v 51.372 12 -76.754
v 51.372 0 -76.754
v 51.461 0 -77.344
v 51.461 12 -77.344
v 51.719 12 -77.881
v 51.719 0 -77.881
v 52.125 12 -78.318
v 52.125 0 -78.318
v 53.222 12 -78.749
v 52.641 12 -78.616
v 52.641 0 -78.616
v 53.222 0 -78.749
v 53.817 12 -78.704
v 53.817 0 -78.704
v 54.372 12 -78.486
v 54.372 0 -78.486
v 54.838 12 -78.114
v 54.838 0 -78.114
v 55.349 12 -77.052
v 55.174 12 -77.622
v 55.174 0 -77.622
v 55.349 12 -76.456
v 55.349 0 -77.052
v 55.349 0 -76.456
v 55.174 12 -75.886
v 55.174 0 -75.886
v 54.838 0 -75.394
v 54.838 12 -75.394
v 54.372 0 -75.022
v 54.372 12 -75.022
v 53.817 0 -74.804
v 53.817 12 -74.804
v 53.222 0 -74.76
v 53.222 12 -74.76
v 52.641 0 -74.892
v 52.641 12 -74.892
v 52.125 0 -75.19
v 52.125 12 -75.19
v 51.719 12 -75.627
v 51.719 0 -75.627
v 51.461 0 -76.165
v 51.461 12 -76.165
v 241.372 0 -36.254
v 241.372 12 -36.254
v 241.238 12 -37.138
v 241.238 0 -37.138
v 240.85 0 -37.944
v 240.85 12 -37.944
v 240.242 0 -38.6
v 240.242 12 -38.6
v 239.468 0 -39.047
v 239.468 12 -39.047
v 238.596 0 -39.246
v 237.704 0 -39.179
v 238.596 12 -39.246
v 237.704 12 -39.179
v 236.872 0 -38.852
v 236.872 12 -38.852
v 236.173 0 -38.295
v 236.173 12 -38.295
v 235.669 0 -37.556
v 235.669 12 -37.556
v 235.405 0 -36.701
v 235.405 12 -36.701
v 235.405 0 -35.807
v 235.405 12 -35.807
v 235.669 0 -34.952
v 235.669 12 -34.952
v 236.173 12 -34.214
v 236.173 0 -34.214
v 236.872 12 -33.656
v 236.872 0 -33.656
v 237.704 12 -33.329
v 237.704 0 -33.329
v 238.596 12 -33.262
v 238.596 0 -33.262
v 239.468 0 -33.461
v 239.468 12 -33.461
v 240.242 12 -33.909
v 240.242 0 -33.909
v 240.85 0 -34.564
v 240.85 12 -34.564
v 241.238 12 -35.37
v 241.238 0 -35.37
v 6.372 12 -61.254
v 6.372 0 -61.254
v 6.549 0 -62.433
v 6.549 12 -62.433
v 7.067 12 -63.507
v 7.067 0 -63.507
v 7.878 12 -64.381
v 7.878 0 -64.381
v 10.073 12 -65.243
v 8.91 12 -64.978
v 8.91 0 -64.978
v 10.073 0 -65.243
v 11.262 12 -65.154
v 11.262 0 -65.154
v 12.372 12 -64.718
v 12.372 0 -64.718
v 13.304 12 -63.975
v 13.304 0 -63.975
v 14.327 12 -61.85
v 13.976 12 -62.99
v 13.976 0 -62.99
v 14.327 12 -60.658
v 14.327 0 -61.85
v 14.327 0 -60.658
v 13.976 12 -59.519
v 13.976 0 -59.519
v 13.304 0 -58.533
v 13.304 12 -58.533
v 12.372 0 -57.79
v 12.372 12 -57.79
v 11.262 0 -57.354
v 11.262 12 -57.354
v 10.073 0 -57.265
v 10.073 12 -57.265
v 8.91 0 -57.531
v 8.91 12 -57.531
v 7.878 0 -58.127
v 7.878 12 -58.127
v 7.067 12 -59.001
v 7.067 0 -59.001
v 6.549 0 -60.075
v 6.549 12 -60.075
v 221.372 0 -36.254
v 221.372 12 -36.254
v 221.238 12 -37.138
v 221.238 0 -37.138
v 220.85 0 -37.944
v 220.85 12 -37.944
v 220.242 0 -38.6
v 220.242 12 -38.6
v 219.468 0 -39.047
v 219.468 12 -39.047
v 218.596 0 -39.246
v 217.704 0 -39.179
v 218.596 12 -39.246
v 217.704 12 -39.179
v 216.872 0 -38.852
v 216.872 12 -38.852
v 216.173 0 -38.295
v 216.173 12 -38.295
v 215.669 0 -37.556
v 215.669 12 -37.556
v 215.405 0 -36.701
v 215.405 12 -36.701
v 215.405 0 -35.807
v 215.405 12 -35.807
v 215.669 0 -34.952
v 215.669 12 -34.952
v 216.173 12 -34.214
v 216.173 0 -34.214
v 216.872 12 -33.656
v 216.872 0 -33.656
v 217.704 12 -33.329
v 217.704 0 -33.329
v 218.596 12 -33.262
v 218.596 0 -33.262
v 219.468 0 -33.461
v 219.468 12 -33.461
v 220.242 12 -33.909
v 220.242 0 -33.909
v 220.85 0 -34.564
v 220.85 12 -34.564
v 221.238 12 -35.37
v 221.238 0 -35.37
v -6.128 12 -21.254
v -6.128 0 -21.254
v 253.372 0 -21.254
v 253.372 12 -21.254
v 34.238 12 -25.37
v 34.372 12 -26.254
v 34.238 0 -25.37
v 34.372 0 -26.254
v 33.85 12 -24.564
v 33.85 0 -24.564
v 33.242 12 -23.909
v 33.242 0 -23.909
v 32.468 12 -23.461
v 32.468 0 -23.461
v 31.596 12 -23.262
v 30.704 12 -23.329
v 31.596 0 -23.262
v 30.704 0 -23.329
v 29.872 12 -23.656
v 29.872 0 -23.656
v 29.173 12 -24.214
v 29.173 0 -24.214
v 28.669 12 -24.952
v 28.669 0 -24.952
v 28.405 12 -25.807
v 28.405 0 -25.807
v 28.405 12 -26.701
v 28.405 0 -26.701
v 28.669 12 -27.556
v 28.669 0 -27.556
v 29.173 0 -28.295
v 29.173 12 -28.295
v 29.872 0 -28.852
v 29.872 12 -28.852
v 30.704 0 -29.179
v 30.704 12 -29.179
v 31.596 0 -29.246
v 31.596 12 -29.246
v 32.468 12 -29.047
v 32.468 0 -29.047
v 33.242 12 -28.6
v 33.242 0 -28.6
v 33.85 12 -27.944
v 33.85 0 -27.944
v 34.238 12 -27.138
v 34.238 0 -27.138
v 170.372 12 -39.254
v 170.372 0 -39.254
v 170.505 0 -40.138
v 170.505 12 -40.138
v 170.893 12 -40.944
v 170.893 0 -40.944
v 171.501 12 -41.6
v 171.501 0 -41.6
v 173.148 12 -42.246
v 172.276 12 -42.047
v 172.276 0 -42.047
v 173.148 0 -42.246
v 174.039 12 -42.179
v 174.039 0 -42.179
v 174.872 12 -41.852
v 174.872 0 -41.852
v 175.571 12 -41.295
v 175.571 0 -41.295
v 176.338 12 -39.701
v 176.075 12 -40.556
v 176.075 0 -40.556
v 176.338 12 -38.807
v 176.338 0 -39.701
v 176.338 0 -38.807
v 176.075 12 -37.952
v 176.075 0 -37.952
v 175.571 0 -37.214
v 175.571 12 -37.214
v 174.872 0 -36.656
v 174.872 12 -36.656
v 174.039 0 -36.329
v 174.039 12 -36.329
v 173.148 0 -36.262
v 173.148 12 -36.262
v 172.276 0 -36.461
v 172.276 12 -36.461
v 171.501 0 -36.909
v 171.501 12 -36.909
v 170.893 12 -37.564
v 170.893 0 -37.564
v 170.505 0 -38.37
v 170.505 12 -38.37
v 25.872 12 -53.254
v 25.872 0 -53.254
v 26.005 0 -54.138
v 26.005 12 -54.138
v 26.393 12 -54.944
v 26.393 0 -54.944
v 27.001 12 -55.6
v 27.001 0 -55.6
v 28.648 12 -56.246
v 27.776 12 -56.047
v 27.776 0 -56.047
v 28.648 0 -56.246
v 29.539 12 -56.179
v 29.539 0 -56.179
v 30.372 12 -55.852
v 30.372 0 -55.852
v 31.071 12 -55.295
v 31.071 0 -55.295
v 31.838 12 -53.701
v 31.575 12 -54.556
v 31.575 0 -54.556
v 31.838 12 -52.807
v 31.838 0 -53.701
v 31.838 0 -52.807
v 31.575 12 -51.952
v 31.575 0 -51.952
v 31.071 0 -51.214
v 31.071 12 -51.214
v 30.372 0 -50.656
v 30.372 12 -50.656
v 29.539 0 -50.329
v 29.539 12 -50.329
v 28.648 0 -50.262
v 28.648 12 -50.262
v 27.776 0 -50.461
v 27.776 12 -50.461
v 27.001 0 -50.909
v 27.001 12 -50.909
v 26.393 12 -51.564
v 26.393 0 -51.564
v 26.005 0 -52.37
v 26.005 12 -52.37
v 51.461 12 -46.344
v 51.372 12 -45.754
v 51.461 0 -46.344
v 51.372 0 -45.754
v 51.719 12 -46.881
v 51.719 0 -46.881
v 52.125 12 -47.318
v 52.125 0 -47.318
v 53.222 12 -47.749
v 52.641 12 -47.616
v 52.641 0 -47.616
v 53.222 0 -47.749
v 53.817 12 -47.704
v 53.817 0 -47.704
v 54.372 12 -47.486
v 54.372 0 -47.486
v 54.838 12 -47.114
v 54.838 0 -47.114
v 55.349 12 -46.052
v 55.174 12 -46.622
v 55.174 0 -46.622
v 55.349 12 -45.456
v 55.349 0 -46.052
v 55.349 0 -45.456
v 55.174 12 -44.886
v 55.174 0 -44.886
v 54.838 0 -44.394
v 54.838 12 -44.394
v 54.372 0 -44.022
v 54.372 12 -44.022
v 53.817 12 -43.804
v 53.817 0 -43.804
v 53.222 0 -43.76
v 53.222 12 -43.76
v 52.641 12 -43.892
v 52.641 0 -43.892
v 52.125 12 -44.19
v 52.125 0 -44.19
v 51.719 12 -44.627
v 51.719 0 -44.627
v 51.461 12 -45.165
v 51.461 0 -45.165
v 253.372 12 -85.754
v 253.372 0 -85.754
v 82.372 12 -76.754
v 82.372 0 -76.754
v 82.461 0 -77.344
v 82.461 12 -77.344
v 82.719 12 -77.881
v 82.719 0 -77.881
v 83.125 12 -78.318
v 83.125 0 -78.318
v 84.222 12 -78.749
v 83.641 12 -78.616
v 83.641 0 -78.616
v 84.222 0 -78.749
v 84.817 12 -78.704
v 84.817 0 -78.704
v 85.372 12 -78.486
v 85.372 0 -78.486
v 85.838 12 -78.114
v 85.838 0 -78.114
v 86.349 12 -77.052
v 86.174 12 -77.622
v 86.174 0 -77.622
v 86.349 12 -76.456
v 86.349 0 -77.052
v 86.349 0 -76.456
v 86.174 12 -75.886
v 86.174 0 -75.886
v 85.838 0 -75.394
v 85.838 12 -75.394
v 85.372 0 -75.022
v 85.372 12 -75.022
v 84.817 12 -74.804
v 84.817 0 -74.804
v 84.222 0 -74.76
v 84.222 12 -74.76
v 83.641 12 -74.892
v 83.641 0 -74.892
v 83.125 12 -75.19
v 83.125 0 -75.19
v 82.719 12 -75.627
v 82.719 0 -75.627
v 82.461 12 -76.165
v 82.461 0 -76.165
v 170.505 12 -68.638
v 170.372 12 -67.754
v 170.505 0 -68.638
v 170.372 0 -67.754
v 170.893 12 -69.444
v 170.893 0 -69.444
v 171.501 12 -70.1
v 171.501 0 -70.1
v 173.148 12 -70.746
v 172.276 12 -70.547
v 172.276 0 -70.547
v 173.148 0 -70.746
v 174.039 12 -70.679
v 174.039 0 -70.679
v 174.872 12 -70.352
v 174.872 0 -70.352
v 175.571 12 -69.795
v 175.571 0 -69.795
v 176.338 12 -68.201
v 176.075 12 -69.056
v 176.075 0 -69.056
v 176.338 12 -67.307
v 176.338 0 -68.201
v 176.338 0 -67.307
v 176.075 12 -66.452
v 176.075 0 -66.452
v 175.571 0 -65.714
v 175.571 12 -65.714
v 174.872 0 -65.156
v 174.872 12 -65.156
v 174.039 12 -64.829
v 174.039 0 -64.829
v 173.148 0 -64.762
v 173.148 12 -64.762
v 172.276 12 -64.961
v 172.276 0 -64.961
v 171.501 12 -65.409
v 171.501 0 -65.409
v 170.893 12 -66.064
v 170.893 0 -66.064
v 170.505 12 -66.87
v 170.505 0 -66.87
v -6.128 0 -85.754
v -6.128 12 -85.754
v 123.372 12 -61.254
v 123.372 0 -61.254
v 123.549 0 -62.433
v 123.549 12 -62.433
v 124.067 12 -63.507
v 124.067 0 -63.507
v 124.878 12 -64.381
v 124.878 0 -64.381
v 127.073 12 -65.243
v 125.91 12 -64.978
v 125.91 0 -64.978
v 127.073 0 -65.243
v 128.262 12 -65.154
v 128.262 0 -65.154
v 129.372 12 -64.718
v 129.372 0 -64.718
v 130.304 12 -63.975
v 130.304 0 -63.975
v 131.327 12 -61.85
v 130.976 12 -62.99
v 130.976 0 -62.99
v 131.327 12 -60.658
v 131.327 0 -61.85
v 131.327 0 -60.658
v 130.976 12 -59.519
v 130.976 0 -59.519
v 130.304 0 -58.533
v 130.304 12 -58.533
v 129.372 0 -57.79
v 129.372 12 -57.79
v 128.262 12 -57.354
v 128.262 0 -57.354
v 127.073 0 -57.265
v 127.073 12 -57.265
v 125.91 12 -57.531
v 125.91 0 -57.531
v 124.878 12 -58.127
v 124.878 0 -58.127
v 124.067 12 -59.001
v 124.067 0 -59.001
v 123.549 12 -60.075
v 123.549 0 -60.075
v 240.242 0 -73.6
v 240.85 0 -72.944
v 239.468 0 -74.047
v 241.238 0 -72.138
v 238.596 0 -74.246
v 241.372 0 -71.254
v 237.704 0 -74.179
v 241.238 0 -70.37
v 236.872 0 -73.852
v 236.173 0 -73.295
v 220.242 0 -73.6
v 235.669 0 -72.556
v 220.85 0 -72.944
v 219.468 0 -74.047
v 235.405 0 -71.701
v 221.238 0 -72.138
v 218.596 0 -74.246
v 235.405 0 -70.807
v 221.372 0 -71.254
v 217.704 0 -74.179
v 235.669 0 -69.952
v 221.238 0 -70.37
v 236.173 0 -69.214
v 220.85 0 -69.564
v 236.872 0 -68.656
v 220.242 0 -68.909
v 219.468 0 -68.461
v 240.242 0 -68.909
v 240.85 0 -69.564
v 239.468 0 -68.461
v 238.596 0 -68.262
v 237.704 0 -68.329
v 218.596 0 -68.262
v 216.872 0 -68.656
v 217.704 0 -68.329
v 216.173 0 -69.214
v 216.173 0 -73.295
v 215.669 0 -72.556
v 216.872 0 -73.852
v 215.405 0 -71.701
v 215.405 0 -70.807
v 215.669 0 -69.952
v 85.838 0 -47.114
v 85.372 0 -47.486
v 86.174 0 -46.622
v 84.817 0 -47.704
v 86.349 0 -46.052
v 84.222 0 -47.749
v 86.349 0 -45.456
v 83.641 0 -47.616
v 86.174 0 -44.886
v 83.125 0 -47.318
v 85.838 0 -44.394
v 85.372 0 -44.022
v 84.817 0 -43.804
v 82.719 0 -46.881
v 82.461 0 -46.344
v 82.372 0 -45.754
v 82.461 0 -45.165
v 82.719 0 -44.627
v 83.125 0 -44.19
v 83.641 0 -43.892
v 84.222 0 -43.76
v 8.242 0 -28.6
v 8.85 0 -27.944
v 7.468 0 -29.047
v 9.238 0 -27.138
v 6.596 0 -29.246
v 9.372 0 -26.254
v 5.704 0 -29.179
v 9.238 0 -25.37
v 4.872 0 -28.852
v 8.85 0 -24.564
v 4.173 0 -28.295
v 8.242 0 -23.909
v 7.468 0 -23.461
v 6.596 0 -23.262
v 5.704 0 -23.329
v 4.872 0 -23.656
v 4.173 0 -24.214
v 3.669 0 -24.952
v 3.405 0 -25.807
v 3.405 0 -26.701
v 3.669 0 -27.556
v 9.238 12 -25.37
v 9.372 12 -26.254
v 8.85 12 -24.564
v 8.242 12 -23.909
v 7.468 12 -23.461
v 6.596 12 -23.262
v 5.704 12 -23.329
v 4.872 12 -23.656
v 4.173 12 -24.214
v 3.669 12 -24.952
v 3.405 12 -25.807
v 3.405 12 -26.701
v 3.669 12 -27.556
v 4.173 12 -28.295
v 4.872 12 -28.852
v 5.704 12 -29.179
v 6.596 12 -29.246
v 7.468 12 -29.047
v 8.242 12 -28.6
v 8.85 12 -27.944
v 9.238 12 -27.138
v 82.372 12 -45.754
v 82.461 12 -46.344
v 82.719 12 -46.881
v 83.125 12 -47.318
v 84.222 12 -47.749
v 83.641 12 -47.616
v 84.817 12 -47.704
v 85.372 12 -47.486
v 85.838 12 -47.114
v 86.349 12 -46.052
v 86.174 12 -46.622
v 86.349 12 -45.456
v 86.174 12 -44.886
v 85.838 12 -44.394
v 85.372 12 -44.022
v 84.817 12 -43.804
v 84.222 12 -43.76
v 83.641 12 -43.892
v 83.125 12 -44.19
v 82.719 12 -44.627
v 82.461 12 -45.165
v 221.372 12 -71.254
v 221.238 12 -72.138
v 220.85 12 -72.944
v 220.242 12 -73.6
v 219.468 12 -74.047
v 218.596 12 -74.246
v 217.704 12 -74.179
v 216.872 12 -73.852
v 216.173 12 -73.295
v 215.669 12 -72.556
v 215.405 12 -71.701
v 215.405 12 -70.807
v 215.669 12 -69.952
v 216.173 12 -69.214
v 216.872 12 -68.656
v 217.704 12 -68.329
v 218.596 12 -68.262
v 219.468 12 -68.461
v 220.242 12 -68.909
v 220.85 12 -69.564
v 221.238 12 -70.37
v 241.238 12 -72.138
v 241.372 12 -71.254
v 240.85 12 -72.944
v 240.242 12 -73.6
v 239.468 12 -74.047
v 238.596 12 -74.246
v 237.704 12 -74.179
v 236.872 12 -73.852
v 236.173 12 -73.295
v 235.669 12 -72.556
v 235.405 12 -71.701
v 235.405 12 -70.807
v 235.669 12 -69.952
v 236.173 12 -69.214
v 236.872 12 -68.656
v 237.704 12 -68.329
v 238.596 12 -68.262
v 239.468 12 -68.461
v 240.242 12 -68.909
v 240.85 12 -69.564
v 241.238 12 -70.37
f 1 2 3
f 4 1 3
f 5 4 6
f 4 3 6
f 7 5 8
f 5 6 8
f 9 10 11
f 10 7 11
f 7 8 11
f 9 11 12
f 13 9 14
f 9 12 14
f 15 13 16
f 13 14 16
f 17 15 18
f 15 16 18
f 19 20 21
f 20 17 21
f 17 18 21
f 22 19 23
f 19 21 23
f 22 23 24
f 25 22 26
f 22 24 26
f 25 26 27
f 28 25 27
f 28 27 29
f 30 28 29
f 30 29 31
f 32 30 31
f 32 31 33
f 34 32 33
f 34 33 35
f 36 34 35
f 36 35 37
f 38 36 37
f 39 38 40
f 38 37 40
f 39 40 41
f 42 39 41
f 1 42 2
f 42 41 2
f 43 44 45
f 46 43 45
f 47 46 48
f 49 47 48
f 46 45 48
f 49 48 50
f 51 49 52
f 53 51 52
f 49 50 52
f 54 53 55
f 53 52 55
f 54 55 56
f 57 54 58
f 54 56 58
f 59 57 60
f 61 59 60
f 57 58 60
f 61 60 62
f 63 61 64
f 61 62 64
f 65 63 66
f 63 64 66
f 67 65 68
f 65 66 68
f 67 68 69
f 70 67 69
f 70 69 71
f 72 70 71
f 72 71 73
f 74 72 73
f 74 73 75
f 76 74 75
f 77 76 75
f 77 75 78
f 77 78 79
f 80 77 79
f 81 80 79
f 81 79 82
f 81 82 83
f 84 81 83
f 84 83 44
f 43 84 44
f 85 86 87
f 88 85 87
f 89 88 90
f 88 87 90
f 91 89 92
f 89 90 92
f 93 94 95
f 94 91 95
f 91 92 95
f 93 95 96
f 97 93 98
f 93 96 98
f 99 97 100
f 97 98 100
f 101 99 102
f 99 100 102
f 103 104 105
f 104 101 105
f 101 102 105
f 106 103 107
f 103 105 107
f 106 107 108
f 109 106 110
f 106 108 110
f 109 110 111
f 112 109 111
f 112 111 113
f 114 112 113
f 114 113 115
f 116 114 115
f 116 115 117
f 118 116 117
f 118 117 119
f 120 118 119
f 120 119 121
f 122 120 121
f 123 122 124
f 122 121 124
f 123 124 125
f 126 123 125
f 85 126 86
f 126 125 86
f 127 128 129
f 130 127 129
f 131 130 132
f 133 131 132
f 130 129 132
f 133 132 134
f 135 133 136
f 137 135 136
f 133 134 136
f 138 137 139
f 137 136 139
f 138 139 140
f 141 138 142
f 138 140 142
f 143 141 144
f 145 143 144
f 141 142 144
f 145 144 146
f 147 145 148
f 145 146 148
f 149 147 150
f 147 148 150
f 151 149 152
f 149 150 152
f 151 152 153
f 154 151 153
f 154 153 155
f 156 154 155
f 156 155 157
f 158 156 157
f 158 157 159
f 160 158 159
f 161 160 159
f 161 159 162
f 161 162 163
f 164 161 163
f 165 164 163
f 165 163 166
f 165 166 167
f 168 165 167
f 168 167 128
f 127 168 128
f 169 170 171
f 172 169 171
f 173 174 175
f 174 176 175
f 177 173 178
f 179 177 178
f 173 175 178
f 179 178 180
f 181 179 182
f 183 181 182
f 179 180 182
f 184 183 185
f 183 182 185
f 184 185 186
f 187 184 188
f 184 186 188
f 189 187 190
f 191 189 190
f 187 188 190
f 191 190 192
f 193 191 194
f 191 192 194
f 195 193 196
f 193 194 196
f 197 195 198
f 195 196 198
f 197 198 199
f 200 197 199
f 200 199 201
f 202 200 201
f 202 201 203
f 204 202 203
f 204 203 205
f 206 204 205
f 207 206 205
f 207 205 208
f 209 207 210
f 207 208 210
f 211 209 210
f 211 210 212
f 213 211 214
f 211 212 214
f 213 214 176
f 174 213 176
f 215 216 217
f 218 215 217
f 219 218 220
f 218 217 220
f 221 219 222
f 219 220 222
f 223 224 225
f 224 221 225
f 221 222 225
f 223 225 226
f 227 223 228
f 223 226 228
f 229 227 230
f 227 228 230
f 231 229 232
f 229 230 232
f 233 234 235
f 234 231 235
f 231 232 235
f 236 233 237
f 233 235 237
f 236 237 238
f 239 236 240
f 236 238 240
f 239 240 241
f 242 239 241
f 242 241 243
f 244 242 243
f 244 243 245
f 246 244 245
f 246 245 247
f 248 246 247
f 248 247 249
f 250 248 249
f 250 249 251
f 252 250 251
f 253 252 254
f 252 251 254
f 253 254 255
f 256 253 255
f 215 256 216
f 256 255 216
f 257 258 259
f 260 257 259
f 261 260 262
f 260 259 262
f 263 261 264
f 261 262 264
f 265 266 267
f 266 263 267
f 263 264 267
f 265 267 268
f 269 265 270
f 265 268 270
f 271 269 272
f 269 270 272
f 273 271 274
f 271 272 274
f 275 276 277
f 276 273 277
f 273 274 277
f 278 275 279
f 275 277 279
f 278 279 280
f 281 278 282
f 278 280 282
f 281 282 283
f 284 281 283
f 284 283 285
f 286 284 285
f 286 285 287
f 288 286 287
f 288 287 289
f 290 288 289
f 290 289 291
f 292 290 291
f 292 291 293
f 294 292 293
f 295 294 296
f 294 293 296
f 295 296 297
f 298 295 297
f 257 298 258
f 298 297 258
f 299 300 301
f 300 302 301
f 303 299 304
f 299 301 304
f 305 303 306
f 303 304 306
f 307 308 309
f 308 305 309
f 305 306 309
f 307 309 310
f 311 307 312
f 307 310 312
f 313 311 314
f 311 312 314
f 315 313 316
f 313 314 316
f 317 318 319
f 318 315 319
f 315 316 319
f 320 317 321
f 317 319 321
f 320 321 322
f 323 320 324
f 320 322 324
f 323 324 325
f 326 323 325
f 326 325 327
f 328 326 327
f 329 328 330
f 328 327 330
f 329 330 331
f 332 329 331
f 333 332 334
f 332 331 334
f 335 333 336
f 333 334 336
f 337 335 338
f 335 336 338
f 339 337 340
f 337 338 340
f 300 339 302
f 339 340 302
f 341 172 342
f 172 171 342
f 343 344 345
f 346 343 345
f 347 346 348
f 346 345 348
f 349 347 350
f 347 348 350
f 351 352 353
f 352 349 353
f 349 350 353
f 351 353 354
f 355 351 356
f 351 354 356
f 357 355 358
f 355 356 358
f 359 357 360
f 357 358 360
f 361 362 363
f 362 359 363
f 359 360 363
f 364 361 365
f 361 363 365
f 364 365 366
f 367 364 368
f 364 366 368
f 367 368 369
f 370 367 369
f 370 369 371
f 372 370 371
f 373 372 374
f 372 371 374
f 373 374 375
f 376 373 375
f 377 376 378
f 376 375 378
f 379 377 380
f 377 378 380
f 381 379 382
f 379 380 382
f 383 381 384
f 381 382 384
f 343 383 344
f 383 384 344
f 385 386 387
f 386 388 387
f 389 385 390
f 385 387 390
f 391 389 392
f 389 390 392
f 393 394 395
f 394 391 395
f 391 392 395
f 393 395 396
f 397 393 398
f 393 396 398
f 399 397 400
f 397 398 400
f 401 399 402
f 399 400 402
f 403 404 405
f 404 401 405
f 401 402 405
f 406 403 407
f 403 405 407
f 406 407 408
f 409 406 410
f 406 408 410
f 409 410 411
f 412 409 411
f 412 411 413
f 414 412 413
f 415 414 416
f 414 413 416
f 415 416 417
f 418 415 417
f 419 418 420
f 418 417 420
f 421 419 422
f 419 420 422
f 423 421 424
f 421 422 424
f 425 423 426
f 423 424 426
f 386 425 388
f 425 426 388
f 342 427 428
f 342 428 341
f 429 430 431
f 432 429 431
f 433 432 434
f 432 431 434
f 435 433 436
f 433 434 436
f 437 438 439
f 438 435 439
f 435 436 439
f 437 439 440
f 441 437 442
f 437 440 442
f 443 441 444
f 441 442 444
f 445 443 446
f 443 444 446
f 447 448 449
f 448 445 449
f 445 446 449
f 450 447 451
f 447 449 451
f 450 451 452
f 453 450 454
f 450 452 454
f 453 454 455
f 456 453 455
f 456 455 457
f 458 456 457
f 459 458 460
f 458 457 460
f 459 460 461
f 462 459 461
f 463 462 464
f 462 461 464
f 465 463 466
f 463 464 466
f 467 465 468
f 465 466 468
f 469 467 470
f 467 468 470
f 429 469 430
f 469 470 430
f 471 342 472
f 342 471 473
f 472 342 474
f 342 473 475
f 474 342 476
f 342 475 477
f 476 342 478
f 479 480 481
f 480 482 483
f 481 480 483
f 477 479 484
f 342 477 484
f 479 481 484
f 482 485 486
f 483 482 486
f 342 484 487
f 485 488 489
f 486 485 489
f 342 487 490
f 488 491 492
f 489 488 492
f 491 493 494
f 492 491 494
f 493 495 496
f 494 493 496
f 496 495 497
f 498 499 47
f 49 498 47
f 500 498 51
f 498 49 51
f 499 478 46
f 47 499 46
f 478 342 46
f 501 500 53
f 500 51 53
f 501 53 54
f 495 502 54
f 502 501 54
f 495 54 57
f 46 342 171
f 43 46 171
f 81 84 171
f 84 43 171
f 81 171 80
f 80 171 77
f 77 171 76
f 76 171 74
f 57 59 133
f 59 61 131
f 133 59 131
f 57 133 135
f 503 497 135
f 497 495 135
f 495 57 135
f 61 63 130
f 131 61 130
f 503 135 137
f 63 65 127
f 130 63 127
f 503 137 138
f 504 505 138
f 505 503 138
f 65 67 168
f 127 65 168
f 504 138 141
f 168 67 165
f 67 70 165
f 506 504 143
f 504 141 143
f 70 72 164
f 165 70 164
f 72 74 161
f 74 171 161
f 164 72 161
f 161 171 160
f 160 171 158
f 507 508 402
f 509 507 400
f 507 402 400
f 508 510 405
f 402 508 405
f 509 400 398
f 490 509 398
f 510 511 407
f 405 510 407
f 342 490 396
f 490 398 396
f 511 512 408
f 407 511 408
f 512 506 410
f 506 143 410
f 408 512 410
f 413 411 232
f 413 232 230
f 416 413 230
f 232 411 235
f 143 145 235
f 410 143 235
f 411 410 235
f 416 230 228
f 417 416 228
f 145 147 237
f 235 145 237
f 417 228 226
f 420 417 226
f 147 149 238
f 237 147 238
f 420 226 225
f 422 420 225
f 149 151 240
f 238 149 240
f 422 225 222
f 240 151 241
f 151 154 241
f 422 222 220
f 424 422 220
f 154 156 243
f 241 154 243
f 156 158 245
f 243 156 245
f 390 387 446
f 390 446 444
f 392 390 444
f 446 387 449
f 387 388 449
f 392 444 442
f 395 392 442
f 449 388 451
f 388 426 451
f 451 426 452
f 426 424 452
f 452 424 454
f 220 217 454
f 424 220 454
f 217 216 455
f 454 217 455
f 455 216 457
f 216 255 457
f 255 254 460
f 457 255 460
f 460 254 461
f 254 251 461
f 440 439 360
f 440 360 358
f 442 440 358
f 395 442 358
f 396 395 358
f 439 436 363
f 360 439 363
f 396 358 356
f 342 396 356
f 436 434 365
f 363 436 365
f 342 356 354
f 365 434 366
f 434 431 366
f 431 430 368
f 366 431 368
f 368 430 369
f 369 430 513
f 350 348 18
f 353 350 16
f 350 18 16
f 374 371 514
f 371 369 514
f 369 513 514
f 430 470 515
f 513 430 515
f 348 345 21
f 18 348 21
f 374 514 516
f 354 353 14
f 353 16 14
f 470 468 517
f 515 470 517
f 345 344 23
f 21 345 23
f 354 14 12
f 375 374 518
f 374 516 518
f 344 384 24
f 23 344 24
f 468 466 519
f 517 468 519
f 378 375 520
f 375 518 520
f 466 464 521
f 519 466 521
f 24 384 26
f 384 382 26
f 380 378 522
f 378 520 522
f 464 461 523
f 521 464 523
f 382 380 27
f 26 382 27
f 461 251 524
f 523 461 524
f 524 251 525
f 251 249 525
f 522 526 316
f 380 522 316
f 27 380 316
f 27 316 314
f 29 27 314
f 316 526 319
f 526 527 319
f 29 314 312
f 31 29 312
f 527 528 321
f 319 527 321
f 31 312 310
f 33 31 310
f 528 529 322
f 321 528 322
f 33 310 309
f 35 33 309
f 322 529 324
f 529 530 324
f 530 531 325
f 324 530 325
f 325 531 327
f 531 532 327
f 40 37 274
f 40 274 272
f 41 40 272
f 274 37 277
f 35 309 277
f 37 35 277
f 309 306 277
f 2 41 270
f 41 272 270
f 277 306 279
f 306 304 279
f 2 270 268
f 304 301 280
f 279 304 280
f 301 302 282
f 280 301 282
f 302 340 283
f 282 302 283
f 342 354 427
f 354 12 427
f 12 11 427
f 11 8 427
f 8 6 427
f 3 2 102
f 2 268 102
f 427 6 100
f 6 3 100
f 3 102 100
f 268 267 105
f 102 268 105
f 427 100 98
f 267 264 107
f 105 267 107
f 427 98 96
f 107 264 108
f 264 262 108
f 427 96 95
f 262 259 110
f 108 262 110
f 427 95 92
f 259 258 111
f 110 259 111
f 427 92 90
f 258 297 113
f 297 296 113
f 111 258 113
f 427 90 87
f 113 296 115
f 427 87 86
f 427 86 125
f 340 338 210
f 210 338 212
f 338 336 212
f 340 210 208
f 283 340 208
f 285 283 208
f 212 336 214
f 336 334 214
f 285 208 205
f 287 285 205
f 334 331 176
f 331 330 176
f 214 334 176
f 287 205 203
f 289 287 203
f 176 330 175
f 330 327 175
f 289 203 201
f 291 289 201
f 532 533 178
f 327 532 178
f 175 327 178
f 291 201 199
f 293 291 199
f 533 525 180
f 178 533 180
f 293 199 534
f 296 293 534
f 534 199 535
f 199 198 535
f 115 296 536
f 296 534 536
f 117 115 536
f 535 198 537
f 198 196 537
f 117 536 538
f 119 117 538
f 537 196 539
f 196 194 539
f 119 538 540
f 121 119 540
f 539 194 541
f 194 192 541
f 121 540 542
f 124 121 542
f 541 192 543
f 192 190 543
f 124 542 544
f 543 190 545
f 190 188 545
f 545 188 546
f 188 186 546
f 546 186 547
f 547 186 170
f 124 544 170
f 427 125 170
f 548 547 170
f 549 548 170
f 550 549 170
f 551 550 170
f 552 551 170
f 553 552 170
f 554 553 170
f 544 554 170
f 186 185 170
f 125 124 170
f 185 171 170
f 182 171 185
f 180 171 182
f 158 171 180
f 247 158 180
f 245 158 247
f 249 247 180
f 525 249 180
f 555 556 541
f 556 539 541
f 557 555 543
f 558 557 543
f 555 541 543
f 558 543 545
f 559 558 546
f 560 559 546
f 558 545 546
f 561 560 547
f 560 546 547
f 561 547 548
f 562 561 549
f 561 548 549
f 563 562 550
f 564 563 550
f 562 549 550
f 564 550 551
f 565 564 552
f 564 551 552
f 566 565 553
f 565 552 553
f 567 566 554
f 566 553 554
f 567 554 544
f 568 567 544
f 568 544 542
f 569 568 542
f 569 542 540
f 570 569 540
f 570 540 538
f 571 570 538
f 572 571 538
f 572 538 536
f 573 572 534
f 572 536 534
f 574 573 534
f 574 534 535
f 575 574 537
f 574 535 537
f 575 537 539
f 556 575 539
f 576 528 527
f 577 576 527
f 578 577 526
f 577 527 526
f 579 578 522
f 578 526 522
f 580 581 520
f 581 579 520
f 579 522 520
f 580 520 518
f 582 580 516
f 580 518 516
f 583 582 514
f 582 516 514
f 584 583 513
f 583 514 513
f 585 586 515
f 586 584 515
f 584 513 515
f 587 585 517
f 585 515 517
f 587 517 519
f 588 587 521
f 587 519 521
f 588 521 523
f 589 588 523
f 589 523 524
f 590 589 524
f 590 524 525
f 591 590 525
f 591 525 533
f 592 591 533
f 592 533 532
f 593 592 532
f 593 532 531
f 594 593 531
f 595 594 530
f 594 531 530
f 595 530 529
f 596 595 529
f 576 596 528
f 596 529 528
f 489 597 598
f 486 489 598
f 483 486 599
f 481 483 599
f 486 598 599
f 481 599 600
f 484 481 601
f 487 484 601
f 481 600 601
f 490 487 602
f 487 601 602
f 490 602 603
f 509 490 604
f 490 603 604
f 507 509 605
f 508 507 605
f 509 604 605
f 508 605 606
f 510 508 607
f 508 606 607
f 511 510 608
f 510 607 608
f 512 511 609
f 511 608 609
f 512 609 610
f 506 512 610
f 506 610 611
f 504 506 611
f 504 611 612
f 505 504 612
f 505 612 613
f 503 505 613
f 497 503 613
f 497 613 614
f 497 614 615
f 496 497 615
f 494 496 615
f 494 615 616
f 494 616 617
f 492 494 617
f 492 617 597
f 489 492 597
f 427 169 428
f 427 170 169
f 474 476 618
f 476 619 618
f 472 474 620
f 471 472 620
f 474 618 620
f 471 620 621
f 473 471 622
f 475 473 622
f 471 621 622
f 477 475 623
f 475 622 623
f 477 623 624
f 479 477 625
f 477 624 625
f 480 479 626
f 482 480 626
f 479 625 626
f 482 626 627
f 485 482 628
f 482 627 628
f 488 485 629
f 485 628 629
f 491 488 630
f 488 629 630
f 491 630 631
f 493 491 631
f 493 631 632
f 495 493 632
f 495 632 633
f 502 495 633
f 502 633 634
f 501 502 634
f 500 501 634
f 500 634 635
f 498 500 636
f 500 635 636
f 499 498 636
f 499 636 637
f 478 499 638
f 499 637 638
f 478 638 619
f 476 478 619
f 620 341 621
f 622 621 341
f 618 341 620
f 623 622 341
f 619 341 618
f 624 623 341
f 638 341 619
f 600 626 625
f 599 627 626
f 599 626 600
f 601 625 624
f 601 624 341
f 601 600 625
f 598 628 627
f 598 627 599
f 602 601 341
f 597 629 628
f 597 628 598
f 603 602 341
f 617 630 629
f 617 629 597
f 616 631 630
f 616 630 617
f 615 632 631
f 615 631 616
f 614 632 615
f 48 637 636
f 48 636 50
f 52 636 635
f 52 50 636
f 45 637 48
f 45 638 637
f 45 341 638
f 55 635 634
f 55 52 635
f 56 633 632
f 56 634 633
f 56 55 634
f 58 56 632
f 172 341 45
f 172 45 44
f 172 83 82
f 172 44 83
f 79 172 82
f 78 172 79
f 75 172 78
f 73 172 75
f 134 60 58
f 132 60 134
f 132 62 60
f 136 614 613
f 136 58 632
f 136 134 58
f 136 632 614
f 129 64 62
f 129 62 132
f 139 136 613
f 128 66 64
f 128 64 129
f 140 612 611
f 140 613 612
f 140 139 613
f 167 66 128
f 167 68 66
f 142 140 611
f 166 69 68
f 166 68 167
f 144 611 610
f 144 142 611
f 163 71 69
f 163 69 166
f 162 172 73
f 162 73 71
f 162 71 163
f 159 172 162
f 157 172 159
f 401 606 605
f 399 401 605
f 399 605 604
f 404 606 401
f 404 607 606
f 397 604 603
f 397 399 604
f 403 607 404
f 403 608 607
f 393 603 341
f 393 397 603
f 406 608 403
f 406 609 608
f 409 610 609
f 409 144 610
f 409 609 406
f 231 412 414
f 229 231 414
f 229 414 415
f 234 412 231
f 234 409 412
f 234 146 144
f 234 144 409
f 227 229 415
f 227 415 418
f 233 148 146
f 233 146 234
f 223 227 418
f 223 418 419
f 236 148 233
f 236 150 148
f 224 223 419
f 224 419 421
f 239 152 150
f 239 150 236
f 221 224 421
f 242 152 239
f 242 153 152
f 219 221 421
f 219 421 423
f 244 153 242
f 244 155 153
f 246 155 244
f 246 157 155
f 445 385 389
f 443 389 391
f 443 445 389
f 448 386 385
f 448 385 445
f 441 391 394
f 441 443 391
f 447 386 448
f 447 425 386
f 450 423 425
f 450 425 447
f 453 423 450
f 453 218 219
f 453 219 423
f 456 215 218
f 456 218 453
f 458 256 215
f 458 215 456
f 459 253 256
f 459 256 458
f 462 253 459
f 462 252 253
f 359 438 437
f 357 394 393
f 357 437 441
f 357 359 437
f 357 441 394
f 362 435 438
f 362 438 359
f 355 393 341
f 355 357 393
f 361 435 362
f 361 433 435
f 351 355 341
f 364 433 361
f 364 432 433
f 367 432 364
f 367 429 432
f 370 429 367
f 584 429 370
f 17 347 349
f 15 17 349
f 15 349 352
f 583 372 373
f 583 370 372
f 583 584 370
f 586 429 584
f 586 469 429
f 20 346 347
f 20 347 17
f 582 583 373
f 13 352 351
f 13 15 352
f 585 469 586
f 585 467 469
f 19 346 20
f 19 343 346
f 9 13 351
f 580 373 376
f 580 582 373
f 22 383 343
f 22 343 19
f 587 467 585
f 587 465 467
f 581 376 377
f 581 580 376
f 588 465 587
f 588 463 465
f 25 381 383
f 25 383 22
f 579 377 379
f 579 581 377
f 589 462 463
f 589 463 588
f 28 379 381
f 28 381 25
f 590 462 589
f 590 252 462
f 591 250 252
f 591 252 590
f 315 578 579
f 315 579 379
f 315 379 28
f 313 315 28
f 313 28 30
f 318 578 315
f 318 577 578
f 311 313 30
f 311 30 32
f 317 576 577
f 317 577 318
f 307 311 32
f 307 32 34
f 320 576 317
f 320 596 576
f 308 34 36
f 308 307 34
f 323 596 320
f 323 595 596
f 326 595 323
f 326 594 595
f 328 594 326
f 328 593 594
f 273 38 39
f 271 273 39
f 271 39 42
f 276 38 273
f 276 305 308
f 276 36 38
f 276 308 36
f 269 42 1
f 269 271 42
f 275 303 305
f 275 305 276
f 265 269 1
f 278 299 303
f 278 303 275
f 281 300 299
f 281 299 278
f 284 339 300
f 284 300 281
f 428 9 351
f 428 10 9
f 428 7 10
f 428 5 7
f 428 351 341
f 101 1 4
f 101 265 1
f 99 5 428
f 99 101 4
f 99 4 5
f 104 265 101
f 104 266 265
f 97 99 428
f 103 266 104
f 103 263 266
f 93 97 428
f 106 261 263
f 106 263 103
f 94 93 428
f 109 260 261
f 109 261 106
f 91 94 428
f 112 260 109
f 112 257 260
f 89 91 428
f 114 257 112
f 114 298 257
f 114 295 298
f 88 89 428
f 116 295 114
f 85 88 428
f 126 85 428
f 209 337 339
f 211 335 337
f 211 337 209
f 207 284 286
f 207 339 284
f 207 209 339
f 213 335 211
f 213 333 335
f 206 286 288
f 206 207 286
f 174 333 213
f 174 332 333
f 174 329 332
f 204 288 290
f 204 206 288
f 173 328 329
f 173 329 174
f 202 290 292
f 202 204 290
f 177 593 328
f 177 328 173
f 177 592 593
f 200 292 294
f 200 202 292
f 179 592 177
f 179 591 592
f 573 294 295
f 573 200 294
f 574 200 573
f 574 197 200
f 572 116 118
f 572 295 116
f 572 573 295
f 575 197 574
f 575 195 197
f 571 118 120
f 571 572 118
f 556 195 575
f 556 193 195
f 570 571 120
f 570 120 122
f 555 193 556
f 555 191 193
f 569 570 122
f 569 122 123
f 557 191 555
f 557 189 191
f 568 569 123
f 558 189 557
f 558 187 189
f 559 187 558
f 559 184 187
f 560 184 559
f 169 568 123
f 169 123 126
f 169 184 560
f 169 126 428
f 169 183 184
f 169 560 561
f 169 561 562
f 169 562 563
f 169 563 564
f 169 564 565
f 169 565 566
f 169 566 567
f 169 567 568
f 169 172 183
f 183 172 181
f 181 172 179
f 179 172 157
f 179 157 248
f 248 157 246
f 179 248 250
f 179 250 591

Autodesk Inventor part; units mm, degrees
ref_plane "YZ Plane" through (0, 0, 0) normal (1, 0, 0) x (0, 1, 0)
ref_plane "XZ Plane" through (0, 0, 0) normal (0, 1, 0) x (-1, 0, 0)
ref_plane "XY Plane" through (0, 0, 0) normal (0, 0, 1) x (1, 0, 0)
sketch "Boceto1" plane through (0, 0, 0) normal (0, 1, 0) x (-1, 0, 0)
  line L0 (6.1283, -21.2541) -> (6.1283, -85.7541)
  line L1 (6.1283, -85.7541) -> (-253.3717, -85.7541)
  line L2 (6.1283, -21.2541) -> (-253.3717, -21.2541)
  line L3 (-253.3717, -21.2541) -> (-253.3717, -85.7541)
  circle A0 centre (-127.3717, -61.2541) radius 4
  circle A1 centre (-10.3717, -61.2541) radius 4
  circle A2 centre (-84.3717, -76.7541) radius 2
  circle A3 centre (-84.3717, -45.7541) radius 2
  circle A4 centre (-53.3717, -76.7541) radius 2
  circle A5 centre (-53.3717, -45.7541) radius 2
  circle A6 centre (-28.8717, -53.2541) radius 3
  circle A7 centre (-173.3717, -67.7541) radius 3
  circle A8 centre (-173.3717, -39.2541) radius 3
  dimension "d0" = 64.5
  dimension "d22" = 8
  dimension "d23" = 8
  dimension "d65" = 4
  dimension "d66" = 4
  dimension "d67" = 4
  dimension "d68" = 4
  dimension "d69" = 31
  dimension "d70" = 31
  dimension "d71" = 31
  dimension "d72" = 31
  dimension "d109" = 117
  dimension "d110" = 259.5
  dimension "d111" = 126
  dimension "d112" = 6
  dimension "d113" = 32
  dimension "d114" = 35
  dimension "d115" = 6
  dimension "d116" = 6
  dimension "d117" = 18
  dimension "d118" = 18
  dimension "d119" = 80
  dimension "d120" = 80
  dimension "d127" = 40
  dimension "d128" = 40
extrude "Extrusion3" add sketch "Boceto1" along normal blind 12
sketch "Sketch2" plane through (0, 0, 0) normal (0, -1, 0) x (1, 0, 0)
  circle A0 centre (6.3717, -26.2541) radius 3
  circle A1 centre (31.3717, -26.2541) radius 3
  line L0 (-6.1283, -21.2541) -> (253.3717, -21.2541) projected
  line L1 (-6.1283, -85.7541) -> (-6.1283, -21.2541) projected
  point P0 (0, 0)
  point P1 (-7.1283, -20.7541)
  point P2 (261.8717, -20.7541)
  point P3 (-7.1283, -85.7541)
  dimension "d84" = 6
  dimension "d85" = 6
  dimension "d86" = 5
  dimension "d87" = 12.5
  dimension "d88" = 25
  dimension "d89" = 5
extrude "Extrusion4" cut sketch "Sketch2" against normal blind 19
sketch "Sketch3" plane through (0, 12, 0) normal (0, 1, 0) x (1, 0, 0)
  circle A0 centre (218.3717, 71.2541) radius 3
  circle A1 centre (238.3717, 71.2541) radius 3
  circle A2 centre (218.3717, 36.2541) radius 3
  circle A3 centre (238.3717, 36.2541) radius 3
  line L0 (253.3717, 85.7541) -> (-6.1283, 85.7541) projected
  line L1 (-6.1283, 21.2541) -> (253.3717, 21.2541) projected
  line L2 (253.3717, 21.2541) -> (253.3717, 85.7541) projected
  point P0 (-7.1283, 85.7541)
  point P1 (-7.1283, 20.7541)
  dimension "d92" = 6
  dimension "d93" = 6
  dimension "d94" = 6
  dimension "d95" = 6
  dimension "d97" = 15
  dimension "d98" = 15
  dimension "d99" = 15
  dimension "d100" = 20
  dimension "d101" = 20
  dimension "d103" = 15
  dimension "d130" = 35
  dimension "d131" = 35
extrude "Extrusion5" cut sketch "Sketch3" against normal blind 20
thread "Rosca1" size "M6x1" class "6H" standard "ISO Metric profile" length 922
thread "Rosca2" size "M6x1" class "6H" standard "ISO Metric profile" length 922
thread "Rosca3" size "M6x1" class "6H" standard "ISO Metric profile" length 922
equation "\"d22\" = d23"
equation "\"d118\" = d117"
equation "\"d120\" = d119"
equation "\"d131\" = d130"
equation "\"d104\" = d100"
properties part number "Columna Derecha" material "Aluminio 6061"
